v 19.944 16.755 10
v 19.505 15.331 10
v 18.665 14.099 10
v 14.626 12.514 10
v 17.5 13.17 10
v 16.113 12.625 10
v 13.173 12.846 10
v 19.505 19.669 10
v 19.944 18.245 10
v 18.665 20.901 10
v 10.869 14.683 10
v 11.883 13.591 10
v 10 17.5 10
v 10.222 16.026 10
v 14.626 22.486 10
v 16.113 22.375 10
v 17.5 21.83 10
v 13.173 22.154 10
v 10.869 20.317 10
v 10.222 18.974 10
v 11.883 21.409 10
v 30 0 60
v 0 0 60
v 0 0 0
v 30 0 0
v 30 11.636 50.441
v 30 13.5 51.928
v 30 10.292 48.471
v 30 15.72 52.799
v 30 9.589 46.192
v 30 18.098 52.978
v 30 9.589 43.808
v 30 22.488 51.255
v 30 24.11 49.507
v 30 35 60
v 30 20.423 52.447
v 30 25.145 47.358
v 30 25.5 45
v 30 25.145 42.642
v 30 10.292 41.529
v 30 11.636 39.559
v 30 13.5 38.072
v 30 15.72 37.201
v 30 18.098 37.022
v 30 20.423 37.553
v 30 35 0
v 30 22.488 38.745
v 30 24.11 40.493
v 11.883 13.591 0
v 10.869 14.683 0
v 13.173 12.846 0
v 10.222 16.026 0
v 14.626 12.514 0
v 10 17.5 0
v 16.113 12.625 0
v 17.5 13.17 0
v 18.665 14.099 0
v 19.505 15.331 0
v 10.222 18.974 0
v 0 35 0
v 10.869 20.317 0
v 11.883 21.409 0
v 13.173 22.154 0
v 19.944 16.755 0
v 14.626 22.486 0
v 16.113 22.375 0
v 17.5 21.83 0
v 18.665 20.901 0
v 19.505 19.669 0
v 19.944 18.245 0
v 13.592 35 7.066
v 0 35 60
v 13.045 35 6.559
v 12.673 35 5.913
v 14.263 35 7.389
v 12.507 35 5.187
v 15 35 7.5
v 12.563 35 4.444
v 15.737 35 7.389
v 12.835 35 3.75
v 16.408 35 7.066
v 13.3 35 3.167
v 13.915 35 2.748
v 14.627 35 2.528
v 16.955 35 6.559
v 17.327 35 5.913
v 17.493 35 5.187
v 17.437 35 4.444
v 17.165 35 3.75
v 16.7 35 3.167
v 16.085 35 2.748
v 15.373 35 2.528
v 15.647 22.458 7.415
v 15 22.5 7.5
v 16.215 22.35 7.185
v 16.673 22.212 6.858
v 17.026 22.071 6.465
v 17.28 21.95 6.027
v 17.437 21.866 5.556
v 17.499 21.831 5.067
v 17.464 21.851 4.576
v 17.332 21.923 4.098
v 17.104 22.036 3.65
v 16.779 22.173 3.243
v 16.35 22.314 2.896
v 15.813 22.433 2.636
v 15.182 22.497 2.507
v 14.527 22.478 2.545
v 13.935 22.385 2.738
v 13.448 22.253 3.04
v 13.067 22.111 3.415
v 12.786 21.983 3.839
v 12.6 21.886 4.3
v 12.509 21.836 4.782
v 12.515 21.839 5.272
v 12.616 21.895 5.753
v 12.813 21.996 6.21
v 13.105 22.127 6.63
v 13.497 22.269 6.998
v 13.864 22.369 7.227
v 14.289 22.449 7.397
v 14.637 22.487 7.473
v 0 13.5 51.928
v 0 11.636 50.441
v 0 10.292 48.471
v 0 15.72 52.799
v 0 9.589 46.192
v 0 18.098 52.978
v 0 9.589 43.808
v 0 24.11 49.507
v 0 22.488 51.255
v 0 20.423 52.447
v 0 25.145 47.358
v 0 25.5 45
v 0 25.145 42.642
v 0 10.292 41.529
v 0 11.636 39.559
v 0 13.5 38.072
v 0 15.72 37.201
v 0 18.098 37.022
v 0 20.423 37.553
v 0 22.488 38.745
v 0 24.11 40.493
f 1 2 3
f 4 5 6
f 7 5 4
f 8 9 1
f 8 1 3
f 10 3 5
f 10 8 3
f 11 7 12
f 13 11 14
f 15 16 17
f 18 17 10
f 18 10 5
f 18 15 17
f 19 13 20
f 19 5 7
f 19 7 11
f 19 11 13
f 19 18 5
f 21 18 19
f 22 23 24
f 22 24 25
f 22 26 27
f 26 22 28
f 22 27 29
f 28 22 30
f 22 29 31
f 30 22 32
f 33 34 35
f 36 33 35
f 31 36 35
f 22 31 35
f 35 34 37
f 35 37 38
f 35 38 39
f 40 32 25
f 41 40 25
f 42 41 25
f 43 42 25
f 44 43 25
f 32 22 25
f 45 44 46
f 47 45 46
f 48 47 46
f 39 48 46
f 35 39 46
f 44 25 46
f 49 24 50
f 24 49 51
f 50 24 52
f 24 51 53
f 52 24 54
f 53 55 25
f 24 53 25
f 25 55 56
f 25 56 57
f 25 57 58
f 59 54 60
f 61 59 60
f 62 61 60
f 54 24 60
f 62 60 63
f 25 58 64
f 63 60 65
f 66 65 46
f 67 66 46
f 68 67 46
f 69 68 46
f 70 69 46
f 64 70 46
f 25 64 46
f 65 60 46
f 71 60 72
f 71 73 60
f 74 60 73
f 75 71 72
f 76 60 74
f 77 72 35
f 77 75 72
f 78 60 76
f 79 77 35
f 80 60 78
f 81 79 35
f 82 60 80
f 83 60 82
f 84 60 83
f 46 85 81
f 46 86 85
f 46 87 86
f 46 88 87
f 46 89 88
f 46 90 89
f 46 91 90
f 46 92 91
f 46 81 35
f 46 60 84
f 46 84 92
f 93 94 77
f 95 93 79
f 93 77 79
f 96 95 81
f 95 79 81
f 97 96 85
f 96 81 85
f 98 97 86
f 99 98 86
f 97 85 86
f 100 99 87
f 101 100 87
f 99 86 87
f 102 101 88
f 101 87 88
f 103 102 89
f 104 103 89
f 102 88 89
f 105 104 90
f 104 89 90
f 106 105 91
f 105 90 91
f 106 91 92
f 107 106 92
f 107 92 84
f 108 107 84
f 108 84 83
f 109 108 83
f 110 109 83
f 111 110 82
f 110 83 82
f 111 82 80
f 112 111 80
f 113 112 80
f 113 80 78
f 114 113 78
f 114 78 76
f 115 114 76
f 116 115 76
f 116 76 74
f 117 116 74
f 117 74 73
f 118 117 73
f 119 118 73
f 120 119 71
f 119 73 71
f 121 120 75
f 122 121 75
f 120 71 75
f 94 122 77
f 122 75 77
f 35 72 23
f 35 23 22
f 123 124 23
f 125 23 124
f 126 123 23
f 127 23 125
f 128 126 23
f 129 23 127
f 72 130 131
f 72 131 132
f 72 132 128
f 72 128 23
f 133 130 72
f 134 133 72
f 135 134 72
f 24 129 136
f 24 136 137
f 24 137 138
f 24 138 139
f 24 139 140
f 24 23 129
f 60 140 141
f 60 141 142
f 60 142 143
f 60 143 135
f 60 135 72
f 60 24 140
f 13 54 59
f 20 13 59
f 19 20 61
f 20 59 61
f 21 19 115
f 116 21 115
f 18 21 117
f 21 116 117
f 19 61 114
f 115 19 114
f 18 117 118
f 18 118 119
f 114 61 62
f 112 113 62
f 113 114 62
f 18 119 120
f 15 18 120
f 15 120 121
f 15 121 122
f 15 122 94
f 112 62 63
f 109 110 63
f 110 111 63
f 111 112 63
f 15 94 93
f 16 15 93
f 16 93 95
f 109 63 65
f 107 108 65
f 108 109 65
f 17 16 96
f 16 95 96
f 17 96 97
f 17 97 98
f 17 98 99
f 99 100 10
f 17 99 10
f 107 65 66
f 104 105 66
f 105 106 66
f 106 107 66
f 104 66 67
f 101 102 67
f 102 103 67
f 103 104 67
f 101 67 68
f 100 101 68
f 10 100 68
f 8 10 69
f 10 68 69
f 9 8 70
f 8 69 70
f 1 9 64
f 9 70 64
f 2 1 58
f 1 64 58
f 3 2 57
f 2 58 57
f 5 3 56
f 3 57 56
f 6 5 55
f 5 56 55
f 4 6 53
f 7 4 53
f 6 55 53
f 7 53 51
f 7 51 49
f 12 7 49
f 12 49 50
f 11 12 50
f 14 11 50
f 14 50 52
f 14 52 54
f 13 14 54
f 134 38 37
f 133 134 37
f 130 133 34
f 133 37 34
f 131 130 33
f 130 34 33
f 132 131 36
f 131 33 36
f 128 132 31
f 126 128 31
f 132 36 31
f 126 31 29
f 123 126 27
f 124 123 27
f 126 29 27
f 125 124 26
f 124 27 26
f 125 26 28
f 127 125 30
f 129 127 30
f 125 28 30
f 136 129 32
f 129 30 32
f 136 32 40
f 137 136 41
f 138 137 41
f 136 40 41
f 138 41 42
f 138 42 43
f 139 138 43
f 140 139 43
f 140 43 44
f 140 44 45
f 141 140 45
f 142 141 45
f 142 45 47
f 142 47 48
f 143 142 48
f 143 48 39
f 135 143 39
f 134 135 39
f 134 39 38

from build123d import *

# Parameters (mm, degrees)
SKETCH1_W           = 30
SKETCH1_H           = 35
BOSS_EXTRUDE1_DEPTH = 60
SKETCH2_R           = 8
CUT_EXTRUDE1_DEPTH  = 76.663729752
SKETCH3_R           = 5
CUT_EXTRUDE2_DEPTH  = 10
SKETCH5_R           = 2.5
CUT_EXTRUDE4_DEPTH  = 15


with BuildPart() as part:
    # Sketch1 → Boss-Extrude1 (new body)
    with BuildSketch(Plane.XY):
        with Locations((15, 17.5)):
            Rectangle(SKETCH1_W, SKETCH1_H)
    extrude(amount=BOSS_EXTRUDE1_DEPTH)

    # Sketch2 → Cut-Extrude1 (cut, through all)
    with BuildSketch(Plane(origin=(30, 0, 0), x_dir=(0, 0, -1), z_dir=(1, 0, 0))):
        with Locations(Location((-45, 17.5, 0), (0, 0, 90))):
            Circle(SKETCH2_R)
    extrude(amount=-CUT_EXTRUDE1_DEPTH, mode=Mode.SUBTRACT)

    # Sketch3 → Cut-Extrude2 (cut)
    with BuildSketch(Plane(origin=(0, 0, 0), x_dir=(-1, 0, 0), z_dir=(0, 0, -1))):
        with Locations((-15, 17.5)):
            Circle(SKETCH3_R)
    extrude(amount=-CUT_EXTRUDE2_DEPTH, mode=Mode.SUBTRACT)

    # Sketch5 → Cut-Extrude4 (cut)
    with BuildSketch(Plane(origin=(0, 35, 0), x_dir=(1, 0, 0), z_dir=(0, 1, 0))):
        with Locations(Location((15, -5, 0), (0, 0, 270))):
            Circle(SKETCH5_R)
    extrude(amount=-CUT_EXTRUDE4_DEPTH, mode=Mode.SUBTRACT)


solid = part.part
